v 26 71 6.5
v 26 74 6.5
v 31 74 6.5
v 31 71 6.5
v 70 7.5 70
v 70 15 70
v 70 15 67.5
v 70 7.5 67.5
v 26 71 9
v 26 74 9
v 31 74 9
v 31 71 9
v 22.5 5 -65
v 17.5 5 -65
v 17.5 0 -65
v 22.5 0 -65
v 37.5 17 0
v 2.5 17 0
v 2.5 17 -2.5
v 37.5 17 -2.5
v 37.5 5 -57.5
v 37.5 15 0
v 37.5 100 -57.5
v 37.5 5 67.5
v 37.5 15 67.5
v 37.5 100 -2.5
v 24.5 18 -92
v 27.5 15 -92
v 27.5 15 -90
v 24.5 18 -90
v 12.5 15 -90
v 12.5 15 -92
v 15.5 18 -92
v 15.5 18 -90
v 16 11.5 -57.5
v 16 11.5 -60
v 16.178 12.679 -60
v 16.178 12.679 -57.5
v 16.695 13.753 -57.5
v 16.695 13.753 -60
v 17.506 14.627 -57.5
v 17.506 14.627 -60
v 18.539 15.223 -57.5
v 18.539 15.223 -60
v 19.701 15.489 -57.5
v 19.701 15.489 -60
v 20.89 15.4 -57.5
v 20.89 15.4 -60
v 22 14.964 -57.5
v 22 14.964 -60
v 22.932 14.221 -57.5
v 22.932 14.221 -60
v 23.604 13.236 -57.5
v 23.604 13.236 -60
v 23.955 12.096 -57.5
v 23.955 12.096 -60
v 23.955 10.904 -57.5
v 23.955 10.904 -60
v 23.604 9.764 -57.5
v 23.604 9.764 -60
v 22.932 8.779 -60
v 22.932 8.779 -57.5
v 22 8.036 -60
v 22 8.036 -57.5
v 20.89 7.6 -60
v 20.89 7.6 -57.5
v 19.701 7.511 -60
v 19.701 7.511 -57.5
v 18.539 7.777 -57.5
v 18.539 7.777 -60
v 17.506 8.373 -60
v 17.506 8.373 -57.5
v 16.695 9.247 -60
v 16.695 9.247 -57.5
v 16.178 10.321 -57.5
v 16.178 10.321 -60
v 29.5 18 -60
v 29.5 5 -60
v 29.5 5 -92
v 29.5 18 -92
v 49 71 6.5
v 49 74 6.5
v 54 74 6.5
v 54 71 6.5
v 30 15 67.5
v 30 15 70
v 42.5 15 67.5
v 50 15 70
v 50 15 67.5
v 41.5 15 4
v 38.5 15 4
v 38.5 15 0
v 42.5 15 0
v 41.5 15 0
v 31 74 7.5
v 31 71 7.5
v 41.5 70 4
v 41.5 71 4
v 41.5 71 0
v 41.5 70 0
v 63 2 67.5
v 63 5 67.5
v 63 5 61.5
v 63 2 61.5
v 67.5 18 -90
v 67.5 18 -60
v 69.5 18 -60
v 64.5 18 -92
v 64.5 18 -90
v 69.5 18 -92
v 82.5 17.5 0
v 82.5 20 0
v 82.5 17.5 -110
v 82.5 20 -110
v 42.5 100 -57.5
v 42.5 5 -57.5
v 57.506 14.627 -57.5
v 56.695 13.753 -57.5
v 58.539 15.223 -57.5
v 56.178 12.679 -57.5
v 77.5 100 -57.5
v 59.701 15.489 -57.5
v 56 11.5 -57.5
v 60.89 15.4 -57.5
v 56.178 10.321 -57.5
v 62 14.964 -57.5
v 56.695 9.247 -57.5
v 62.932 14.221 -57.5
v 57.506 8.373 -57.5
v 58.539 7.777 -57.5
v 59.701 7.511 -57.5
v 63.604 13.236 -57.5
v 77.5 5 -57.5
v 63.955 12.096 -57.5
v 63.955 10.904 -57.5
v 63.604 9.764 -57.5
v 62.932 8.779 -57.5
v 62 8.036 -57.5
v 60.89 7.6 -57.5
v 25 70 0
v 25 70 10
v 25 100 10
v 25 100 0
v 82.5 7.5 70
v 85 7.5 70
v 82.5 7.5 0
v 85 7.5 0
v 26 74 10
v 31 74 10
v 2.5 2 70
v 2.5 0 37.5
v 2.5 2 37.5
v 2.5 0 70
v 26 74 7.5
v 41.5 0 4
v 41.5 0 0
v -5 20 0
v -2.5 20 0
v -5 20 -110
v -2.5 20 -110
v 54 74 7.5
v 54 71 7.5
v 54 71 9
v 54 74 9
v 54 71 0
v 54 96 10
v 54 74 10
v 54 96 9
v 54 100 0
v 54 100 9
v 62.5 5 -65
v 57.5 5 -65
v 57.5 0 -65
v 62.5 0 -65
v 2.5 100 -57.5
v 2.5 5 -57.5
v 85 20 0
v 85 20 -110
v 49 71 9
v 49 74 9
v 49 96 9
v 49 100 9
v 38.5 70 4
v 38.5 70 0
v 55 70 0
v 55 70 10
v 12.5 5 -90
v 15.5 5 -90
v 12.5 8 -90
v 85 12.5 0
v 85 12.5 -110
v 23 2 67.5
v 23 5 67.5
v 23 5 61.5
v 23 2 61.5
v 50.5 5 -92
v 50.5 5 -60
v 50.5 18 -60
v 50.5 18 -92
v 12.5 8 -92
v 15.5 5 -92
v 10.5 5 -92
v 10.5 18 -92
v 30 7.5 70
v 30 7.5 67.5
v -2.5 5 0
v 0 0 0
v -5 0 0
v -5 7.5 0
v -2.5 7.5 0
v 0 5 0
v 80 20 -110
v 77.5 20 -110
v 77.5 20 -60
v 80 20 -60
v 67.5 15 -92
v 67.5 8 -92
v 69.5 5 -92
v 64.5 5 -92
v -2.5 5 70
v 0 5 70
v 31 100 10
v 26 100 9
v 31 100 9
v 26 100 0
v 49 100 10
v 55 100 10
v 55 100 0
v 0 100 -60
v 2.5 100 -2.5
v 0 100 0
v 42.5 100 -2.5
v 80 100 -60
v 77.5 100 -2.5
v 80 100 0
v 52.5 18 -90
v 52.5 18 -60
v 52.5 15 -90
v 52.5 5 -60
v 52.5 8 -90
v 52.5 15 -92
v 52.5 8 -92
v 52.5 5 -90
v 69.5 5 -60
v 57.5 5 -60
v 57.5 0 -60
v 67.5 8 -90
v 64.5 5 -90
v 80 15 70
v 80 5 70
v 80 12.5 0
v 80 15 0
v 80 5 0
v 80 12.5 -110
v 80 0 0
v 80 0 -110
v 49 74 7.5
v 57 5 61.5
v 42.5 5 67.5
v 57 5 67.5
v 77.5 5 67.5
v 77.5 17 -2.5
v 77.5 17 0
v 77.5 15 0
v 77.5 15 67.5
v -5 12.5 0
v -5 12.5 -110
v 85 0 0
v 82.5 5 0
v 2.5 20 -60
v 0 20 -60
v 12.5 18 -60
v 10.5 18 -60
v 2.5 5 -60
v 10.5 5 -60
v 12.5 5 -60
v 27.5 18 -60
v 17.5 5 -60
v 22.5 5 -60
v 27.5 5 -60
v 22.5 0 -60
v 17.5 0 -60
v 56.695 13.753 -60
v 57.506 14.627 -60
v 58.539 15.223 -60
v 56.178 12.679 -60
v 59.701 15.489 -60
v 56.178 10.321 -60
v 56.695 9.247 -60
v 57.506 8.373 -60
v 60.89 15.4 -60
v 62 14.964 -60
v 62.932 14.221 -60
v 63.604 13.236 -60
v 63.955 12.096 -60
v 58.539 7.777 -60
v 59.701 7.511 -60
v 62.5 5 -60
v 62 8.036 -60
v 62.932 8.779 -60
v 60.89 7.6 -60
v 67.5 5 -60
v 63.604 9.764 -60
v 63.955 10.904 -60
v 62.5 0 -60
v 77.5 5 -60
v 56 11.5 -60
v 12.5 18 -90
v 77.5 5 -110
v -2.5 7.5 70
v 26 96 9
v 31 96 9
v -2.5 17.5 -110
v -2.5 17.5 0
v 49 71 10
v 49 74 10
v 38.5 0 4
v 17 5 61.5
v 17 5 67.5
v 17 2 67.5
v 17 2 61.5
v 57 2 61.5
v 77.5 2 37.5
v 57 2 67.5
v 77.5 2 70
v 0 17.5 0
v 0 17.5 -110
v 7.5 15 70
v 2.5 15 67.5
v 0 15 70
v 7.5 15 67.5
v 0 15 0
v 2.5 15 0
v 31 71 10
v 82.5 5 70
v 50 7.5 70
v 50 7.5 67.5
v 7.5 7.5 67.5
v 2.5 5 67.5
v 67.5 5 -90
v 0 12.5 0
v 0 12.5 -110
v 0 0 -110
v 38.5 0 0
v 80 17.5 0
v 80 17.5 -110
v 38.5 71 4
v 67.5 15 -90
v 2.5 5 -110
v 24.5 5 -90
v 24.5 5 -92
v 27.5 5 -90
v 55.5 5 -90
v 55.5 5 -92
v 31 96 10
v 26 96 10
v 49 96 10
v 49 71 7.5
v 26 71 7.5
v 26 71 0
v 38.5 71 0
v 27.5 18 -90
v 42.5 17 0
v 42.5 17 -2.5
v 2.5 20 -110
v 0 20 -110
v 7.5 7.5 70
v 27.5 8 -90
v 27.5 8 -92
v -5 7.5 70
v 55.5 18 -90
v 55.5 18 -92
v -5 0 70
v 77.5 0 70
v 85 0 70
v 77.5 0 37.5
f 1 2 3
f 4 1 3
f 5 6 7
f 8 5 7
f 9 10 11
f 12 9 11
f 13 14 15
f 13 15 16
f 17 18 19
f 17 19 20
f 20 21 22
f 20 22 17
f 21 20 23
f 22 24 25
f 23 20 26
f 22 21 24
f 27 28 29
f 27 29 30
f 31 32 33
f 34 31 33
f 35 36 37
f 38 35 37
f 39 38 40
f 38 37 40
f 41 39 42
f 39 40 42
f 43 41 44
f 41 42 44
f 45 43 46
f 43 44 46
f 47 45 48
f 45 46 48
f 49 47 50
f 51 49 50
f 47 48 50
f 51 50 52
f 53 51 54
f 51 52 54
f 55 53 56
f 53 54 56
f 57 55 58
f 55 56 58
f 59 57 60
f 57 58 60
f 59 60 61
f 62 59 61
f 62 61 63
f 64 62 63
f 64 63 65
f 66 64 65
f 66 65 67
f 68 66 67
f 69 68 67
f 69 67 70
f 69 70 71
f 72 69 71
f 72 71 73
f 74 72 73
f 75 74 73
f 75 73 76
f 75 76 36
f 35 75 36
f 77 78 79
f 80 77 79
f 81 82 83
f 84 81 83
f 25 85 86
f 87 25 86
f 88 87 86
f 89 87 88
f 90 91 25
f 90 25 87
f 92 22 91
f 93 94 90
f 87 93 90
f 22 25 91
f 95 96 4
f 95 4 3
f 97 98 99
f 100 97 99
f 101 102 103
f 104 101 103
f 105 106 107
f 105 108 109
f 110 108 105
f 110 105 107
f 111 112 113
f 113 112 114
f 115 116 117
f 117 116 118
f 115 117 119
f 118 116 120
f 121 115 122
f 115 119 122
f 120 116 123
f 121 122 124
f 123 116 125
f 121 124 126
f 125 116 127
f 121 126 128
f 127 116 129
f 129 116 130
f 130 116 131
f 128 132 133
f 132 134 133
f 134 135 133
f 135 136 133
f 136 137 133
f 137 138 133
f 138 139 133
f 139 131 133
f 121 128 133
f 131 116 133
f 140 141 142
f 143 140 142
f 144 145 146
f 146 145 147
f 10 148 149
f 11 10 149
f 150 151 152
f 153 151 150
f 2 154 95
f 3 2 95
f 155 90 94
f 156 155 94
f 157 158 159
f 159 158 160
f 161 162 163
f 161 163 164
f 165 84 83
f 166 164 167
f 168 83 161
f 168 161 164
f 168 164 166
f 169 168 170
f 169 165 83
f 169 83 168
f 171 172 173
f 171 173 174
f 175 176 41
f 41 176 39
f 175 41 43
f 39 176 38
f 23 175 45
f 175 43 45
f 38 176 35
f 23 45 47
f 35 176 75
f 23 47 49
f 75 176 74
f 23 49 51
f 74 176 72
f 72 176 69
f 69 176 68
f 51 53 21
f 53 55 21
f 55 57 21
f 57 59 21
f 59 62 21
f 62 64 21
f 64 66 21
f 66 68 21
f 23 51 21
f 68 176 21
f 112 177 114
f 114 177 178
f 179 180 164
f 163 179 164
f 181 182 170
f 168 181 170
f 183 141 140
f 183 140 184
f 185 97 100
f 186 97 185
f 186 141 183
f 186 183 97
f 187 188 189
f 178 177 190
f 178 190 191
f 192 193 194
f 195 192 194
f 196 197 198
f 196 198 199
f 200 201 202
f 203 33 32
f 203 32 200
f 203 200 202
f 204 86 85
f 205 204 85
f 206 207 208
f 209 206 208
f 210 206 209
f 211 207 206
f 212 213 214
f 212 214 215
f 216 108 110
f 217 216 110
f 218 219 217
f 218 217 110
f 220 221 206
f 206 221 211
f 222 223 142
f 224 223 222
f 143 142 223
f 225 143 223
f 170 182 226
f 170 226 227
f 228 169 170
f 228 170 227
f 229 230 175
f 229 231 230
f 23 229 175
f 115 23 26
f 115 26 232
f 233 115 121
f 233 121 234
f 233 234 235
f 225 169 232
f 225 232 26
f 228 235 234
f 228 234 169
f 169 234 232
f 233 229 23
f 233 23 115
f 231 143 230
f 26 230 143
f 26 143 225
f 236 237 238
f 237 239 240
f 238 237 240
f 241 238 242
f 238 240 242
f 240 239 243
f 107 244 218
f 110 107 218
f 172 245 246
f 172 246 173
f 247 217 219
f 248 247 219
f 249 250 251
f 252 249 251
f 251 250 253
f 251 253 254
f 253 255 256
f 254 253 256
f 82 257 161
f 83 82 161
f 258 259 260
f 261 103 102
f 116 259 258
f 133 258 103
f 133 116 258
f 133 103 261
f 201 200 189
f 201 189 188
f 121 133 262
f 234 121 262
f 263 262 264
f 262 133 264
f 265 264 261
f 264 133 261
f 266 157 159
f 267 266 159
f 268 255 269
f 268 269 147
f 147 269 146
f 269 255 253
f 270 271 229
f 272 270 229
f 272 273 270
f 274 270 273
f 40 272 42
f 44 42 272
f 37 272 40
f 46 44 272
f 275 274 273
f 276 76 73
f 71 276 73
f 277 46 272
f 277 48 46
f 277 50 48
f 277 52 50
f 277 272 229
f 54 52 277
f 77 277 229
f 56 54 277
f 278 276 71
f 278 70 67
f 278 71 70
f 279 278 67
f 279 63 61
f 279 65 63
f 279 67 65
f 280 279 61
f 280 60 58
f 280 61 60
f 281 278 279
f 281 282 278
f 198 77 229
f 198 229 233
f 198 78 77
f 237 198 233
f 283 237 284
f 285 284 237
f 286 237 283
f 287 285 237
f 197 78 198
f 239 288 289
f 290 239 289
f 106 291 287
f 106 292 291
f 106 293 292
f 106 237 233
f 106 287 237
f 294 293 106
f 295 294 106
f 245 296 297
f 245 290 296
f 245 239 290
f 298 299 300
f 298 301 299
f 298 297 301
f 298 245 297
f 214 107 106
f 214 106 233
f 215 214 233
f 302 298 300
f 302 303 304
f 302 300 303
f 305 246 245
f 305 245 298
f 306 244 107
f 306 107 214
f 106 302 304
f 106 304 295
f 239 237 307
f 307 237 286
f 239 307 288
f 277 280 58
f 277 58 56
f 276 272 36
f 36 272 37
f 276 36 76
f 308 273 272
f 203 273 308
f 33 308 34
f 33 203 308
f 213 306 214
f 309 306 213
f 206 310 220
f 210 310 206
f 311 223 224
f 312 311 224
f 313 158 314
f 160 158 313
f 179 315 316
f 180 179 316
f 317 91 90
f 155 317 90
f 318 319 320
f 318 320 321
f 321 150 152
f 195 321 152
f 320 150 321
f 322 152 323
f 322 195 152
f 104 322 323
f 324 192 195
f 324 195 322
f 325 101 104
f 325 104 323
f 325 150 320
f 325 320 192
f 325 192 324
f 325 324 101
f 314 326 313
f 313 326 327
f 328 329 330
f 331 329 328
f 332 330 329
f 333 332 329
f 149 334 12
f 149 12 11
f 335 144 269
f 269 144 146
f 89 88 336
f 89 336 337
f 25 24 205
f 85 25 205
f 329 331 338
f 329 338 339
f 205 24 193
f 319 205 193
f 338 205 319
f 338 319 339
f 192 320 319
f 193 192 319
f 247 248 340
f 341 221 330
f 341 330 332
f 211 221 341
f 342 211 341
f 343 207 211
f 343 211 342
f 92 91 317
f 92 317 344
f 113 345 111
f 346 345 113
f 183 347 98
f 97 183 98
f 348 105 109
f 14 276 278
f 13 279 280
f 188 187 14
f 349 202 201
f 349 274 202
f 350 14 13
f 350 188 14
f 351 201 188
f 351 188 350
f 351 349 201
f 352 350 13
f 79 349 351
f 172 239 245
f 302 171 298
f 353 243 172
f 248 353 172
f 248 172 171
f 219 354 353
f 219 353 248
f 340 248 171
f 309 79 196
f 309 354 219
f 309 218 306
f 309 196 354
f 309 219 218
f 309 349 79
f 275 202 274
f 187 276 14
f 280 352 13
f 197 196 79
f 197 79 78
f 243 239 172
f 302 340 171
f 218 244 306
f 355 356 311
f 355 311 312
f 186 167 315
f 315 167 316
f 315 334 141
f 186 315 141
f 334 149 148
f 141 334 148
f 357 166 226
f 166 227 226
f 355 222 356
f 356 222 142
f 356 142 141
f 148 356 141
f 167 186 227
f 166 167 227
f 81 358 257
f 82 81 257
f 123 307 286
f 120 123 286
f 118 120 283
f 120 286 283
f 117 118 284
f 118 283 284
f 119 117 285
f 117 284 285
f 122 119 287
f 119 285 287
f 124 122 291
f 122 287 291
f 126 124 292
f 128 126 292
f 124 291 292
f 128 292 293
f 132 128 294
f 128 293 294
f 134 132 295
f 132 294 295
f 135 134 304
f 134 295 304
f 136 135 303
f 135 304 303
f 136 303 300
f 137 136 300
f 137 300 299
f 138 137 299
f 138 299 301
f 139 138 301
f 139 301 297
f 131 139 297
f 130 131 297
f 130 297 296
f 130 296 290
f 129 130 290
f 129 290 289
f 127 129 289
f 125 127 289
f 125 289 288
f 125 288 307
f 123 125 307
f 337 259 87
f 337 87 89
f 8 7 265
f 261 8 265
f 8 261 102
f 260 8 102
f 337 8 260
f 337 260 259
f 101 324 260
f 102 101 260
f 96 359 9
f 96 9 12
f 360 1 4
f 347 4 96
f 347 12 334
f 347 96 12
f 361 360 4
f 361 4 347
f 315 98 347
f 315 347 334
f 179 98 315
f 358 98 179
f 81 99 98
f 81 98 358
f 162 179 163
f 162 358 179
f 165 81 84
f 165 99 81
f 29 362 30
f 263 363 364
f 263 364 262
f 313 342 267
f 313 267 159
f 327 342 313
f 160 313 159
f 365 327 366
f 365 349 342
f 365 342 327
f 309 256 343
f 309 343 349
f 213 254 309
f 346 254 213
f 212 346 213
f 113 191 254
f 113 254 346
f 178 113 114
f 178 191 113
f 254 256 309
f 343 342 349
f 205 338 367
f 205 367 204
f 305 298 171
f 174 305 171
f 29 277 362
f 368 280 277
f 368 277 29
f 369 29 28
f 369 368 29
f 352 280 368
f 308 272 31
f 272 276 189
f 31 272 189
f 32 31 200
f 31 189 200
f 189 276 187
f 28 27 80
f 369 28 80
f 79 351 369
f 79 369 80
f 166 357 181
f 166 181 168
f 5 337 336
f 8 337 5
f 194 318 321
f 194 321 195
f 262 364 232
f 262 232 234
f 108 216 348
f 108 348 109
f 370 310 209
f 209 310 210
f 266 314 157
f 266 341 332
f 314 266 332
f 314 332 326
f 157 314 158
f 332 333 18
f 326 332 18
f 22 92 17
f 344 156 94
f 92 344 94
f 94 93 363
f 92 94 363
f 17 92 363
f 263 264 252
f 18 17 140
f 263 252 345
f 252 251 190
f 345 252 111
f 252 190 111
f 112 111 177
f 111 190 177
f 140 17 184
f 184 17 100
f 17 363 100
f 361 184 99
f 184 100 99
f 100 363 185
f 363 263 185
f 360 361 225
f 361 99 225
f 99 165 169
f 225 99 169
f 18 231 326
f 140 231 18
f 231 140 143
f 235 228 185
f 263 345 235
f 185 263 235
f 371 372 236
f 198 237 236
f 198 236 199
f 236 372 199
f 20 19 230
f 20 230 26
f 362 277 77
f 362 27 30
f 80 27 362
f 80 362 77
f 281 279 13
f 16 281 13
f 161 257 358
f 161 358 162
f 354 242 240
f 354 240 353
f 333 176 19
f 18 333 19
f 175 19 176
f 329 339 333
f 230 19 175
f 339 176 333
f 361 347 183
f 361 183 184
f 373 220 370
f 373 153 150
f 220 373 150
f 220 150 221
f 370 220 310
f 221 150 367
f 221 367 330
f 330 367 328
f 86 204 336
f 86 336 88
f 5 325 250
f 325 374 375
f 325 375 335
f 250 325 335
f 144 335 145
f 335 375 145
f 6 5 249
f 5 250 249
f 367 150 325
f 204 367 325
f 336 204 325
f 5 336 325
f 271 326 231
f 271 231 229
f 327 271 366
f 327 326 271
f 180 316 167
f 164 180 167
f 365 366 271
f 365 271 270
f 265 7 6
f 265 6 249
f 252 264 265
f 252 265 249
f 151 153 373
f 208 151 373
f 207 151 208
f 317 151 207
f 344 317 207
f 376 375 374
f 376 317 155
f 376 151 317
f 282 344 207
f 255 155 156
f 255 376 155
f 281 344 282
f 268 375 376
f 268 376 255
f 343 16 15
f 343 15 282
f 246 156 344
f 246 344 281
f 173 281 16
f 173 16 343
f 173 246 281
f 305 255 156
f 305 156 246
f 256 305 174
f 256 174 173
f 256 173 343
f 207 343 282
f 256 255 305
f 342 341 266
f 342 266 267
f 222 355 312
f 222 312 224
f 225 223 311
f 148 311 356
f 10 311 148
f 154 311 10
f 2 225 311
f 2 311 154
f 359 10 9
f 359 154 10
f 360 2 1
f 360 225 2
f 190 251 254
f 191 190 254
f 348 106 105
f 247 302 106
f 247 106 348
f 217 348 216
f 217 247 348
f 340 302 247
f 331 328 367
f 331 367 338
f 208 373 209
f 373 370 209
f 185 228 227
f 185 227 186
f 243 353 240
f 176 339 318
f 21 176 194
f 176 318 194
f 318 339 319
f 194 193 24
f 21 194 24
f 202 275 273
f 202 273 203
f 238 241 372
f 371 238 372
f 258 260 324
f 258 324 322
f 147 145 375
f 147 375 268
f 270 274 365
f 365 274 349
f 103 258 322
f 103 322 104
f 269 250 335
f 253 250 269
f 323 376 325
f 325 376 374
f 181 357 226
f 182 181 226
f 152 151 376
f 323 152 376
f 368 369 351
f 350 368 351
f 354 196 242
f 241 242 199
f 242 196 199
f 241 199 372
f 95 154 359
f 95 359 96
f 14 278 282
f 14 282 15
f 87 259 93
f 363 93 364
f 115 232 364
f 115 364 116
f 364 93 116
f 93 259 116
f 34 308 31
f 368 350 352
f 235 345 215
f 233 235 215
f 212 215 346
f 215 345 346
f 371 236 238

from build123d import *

# Parameters (mm, degrees)
SKETCH1_W                                   = 80
SKETCH1_H                                   = 60
BOSS_EXTRUDE1_DEPTH                         = 100
CUT_EXTRUDE1_START                          = 5
SKETCH2_W                                   = 35
SKETCH2_H                                   = 55
CUT_EXTRUDE1_DEPTH                          = 95
SKETCH3_W                                   = 80
SKETCH3_H                                   = 5
BOSS_EXTRUDE2_DEPTH                         = 70
BOSS_EXTRUDE3_DEPTH                         = 10
SKETCH5_W                                   = 22.5
SKETCH5_H                                   = 2.5
SKETCH5_W_2                                 = 20
CUT_EXTRUDE2_DEPTH                          = 7.5
SKETCH6_W                                   = 35
SKETCH6_H                                   = 12
CUT_EXTRUDE4_DEPTH                          = 57.5
CUT_EXTRUDE6_REACH                          = 184.483
SKETCH7_R                                   = 4
SKETCH9_W                                   = 80
SKETCH9_H                                   = 50
BOSS_EXTRUDE4_DEPTH                         = 5
SKETCH11_W                                  = 75
SKETCH11_H                                  = 32.5
CUT_EXTRUDE7_DEPTH                          = 2
SKETCH13_W                                  = 6
SKETCH13_H                                  = 6
CUT_EXTRUDE8_DEPTH                          = 166.90660023
BOSS_EXTRUDE5_DEPTH                         = 10
SKETCH15_W                                  = 6
SKETCH15_H                                  = 4
BOSS_EXTRUDE6_DEPTH                         = 1
BOSS_EXTRUDE7_START                         = -2.5
SKETCH15_2_W                                = 6
SKETCH15_2_H                                = 4
BOSS_EXTRUDE7_DEPTH                         = 1
SKETCH17_W                                  = 6
SKETCH17_H                                  = 4
BOSS_EXTRUDE8_DEPTH                         = 1
SKETCH18_W                                  = 3
SKETCH18_H                                  = 4
CUT_EXTRUDE9_OLED_CABLE_DEPTH               = 154.430766146
SKETCH20_W                                  = 5
SKETCH20_H                                  = 5
CUT_EXTRUDE10_SOLENOID_WIRE_DEPTH           = 166.90660023
SKETCH21_W                                  = 2
SKETCH21_H                                  = 32
BOSS_EXTRUDE9_SOLENOID_SIDE_SUPPORT_DEPTH   = 13
BOSS_EXTRUDE12_SOLENOID_REAR_SUPPORT_DEPTH  = 2
SKETCH27_W                                  = 2.5
SKETCH27_H                                  = 50
BOSS_EXTRUDE13_SOLENOID_SECTION_WALLS_DEPTH = 15
SKETCH29_W                                  = 70
SKETCH29_H                                  = 5
SKETCH29_W_2                                = 110
BOSS_EXTRUDE14_GUIDE_DEPTH                  = 5
BOSS_EXTRUDE15_START                        = -80
SKETCH29_2_W                                = 70
SKETCH29_2_H                                = 5
SKETCH29_2_W_2                              = 110
BOSS_EXTRUDE15_DEPTH                        = 5
SKETCH30_W                                  = 110
SKETCH30_H                                  = 2.5
SKETCH30_W_2                                = 70
BOSS_EXTRUDE16_DEPTH                        = 2.5
BOSS_EXTRUDE17_START                        = -87.5
SKETCH30_2_W                                = 110
SKETCH30_2_H                                = 2.5
SKETCH30_2_W_2                              = 70
BOSS_EXTRUDE17_DEPTH                        = 2.5


with BuildPart() as part:
    # Sketch1 → Boss-Extrude1 (new body)
    with BuildSketch(Plane(origin=(0, 0, 0), x_dir=(1, 0, 0), z_dir=(0, 1, 0))):
        with Locations((40, 30)):
            Rectangle(SKETCH1_W, SKETCH1_H)
    extrude(amount=BOSS_EXTRUDE1_DEPTH)

    # Sketch2 → Cut-Extrude1 (cut)
    with BuildSketch(Plane(origin=(0, 0, 0), x_dir=(1, 0, 0), z_dir=(0, 1, 0)).offset(CUT_EXTRUDE1_START)):
        with Locations((20, 30)):
            Rectangle(SKETCH2_W, SKETCH2_H)
        with Locations((60, 30)):
            Rectangle(SKETCH2_W, SKETCH2_H)
    extrude(amount=CUT_EXTRUDE1_DEPTH, mode=Mode.SUBTRACT)

    # Sketch3 → Boss-Extrude2 (add)
    with BuildSketch(Plane.XY):
        with Locations((40, 2.5)):
            Rectangle(SKETCH3_W, SKETCH3_H)
    extrude(amount=BOSS_EXTRUDE2_DEPTH)

    # Sketch4 → Boss-Extrude3 (add)
    with BuildSketch(Plane(origin=(0, 5, 0), x_dir=(1, 0, 0), z_dir=(0, 1, 0))):
        Polygon((80, 0), (77.5, 0), (77.5, -67.5), (42.5, -67.5), (42.5, 0), (37.5, 0), (37.5, -67.5), (2.5, -67.5), (2.5, 0), (0, 0), (0, -70), (80, -70), align=None)
    extrude(amount=BOSS_EXTRUDE3_DEPTH)

    # Sketch5 → Cut-Extrude2 (cut)
    with BuildSketch(Plane(origin=(0, 15, 0), x_dir=(1, 0, 0), z_dir=(0, 1, 0))):
        with Locations((18.75, -68.75)):
            Rectangle(SKETCH5_W, SKETCH5_H)
        with Locations((60, -68.75)):
            Rectangle(SKETCH5_W_2, SKETCH5_H)
    extrude(amount=-CUT_EXTRUDE2_DEPTH, mode=Mode.SUBTRACT)

    # Sketch6 → Cut-Extrude4 (cut)
    with BuildSketch(Plane.XY):
        with Locations((20, 11)):
            Rectangle(SKETCH6_W, SKETCH6_H)
        with Locations((60, 11)):
            Rectangle(SKETCH6_W, SKETCH6_H)
    extrude(amount=-CUT_EXTRUDE4_DEPTH, mode=Mode.SUBTRACT)

    # Sketch7 → Cut-Extrude6 (cut, up to next)
    with BuildSketch(Plane(origin=(0, 0, -60), x_dir=(-1, 0, 0), z_dir=(0, 0, -1)), mode=Mode.PRIVATE) as cut_extrude6_sk1:
        with Locations((-20, 11.5)):
            Circle(SKETCH7_R)
    cut_extrude6_tool1 = extrude(cut_extrude6_sk1.sketch, amount=-CUT_EXTRUDE6_REACH, mode=Mode.PRIVATE) & part.part
    # Sketch7 → Cut-Extrude6 (cut, up to next)
    with BuildSketch(Plane(origin=(0, 0, -60), x_dir=(-1, 0, 0), z_dir=(0, 0, -1)), mode=Mode.PRIVATE) as cut_extrude6_sk2:
        with Locations((-60, 11.5)):
            Circle(SKETCH7_R)
    cut_extrude6_tool2 = extrude(cut_extrude6_sk2.sketch, amount=-CUT_EXTRUDE6_REACH, mode=Mode.PRIVATE) & part.part
    add(cut_extrude6_tool1.solids().sort_by_distance((20, 11.5, -60))[0], mode=Mode.SUBTRACT)
    add(cut_extrude6_tool2.solids().sort_by_distance((60, 11.5, -60))[0], mode=Mode.SUBTRACT)

    # Sketch9 → Boss-Extrude4 (add)
    with BuildSketch(Plane(origin=(0, 0, 0), x_dir=(1, 0, 0), z_dir=(0, 1, 0))):
        with Locations((40, 85)):
            Rectangle(SKETCH9_W, SKETCH9_H)
    extrude(amount=BOSS_EXTRUDE4_DEPTH)

    # Sketch11 → Cut-Extrude7 (cut)
    with BuildSketch(Plane.XZ):
        with Locations((40, 53.75)):
            Rectangle(SKETCH11_W, SKETCH11_H)
    extrude(amount=-CUT_EXTRUDE7_DEPTH, mode=Mode.SUBTRACT)

    # Sketch13 → Cut-Extrude8 (cut, through all)
    with BuildSketch(Plane(origin=(0, 5, 0), x_dir=(1, 0, 0), z_dir=(0, 1, 0))):
        with Locations((20, -64.5)):
            Rectangle(SKETCH13_W, SKETCH13_H)
        with Locations((60, -64.5)):
            Rectangle(SKETCH13_W, SKETCH13_H)
    extrude(amount=-CUT_EXTRUDE8_DEPTH, mode=Mode.SUBTRACT)

    # Sketch14 → Boss-Extrude5 (add)
    with BuildSketch(Plane.XY):
        Polygon((25, 100), (26, 100), (26, 71), (54, 71), (54, 100), (55, 100), (55, 70), (54, 70), (26, 70), (25, 70), align=None)
    extrude(amount=BOSS_EXTRUDE5_DEPTH)

    # Sketch15 → Boss-Extrude6 (add)
    with BuildSketch(Plane.XY.offset(10)):
        with Locations((28, 72)):
            Rectangle(SKETCH15_W, SKETCH15_H)
        with Locations((52, 72)):
            Rectangle(SKETCH15_W, SKETCH15_H)
    extrude(amount=-BOSS_EXTRUDE6_DEPTH)

    # Sketch15<2> → Boss-Extrude7 (add)
    with BuildSketch(Plane.XY.offset(10).offset(BOSS_EXTRUDE7_START)):
        with Locations((28, 72)):
            Rectangle(SKETCH15_2_W, SKETCH15_2_H)
        with Locations((52, 72)):
            Rectangle(SKETCH15_2_W, SKETCH15_2_H)
    extrude(amount=-BOSS_EXTRUDE7_DEPTH)

    # Sketch17 → Boss-Extrude8 (add)
    with BuildSketch(Plane.XY.offset(10)):
        with Locations((28, 98)):
            Rectangle(SKETCH17_W, SKETCH17_H)
        with Locations((52, 98)):
            Rectangle(SKETCH17_W, SKETCH17_H)
    extrude(amount=-BOSS_EXTRUDE8_DEPTH)

    # Sketch18 → Cut-Extrude9 (OLED Cable) (cut, through all)
    with BuildSketch(Plane(origin=(0, 71, 0), x_dir=(1, 0, 0), z_dir=(0, 1, 0))):
        with Locations((40, -2)):
            Rectangle(SKETCH18_W, SKETCH18_H)
    extrude(amount=-CUT_EXTRUDE9_OLED_CABLE_DEPTH, mode=Mode.SUBTRACT)

    # Sketch20 → Cut-Extrude10 (Solenoid Wire) (cut, through all)
    with BuildSketch(Plane(origin=(0, 5, 0), x_dir=(1, 0, 0), z_dir=(0, 1, 0))):
        with Locations((60, 62.5)):
            Rectangle(SKETCH20_W, SKETCH20_H)
        with Locations((20, 62.5)):
            Rectangle(SKETCH20_W, SKETCH20_H)
    extrude(amount=-CUT_EXTRUDE10_SOLENOID_WIRE_DEPTH, mode=Mode.SUBTRACT)

    # Sketch21 → Boss-Extrude9 (Solenoid Side Support) (add)
    with BuildSketch(Plane(origin=(0, 5, 0), x_dir=(1, 0, 0), z_dir=(0, 1, 0))):
        with Locations((68.5, 76)):
            Rectangle(SKETCH21_W, SKETCH21_H)
        with Locations((51.5, 76)):
            Rectangle(SKETCH21_W, SKETCH21_H)
        with Locations((28.5, 76)):
            Rectangle(SKETCH21_W, SKETCH21_H)
        with Locations((11.5, 76)):
            Rectangle(SKETCH21_W, SKETCH21_H)
    extrude(amount=BOSS_EXTRUDE9_SOLENOID_SIDE_SUPPORT_DEPTH)

    # Sketch25 → Boss-Extrude12 (Solenoid Rear Support) (add)
    with BuildSketch(Plane(origin=(0, 0, -92), x_dir=(-1, 0, 0), z_dir=(0, 0, -1))):
        Polygon((-55.5, 18), (-52.5, 18), (-52.5, 15), align=None)
        Polygon((-52.5, 5), (-52.5, 8), (-55.5, 5), align=None)
        Polygon((-67.5, 18), (-67.5, 15), (-64.5, 18), align=None)
        Polygon((-64.5, 5), (-67.5, 5), (-67.5, 8), align=None)
        Polygon((-15.5, 18), (-12.5, 18), (-12.5, 15), align=None)
        Polygon((-12.5, 5), (-12.5, 8), (-15.5, 5), align=None)
        Polygon((-27.5, 18), (-27.5, 15), (-24.5, 18), align=None)
        Polygon((-24.5, 5), (-27.5, 5), (-27.5, 8), align=None)
    extrude(amount=-BOSS_EXTRUDE12_SOLENOID_REAR_SUPPORT_DEPTH)

    # Sketch27 → Boss-Extrude13 (Solenoid Section Walls) (add)
    with BuildSketch(Plane(origin=(0, 5, 0), x_dir=(1, 0, 0), z_dir=(0, 1, 0))):
        with Locations((78.75, 85)):
            Rectangle(SKETCH27_W, SKETCH27_H)
        with Locations((1.25, 85)):
            Rectangle(SKETCH27_W, SKETCH27_H)
    extrude(amount=BOSS_EXTRUDE13_SOLENOID_SECTION_WALLS_DEPTH)

    # Sketch29 → Boss-Extrude14 (Guide) (add)
    with BuildSketch(Plane(origin=(80, 0, 0), x_dir=(0, 0, -1), z_dir=(1, 0, 0))):
        with Locations((-35, 2.5)):
            Rectangle(SKETCH29_W, SKETCH29_H)
        with Locations((55, 15)):
            Rectangle(SKETCH29_W_2, SKETCH29_H)
    extrude(amount=BOSS_EXTRUDE14_GUIDE_DEPTH)

    # Sketch29<2> → Boss-Extrude15 (add)
    with BuildSketch(Plane(origin=(80, 0, 0), x_dir=(0, 0, -1), z_dir=(1, 0, 0)).offset(BOSS_EXTRUDE15_START)):
        with Locations((-35, 2.5)):
            Rectangle(SKETCH29_2_W, SKETCH29_2_H)
        with Locations((55, 15)):
            Rectangle(SKETCH29_2_W_2, SKETCH29_2_H)
    extrude(amount=-BOSS_EXTRUDE15_DEPTH)

    # Sketch30 → Boss-Extrude16 (add)
    with BuildSketch(Plane(origin=(85, 0, 0), x_dir=(0, 0, -1), z_dir=(1, 0, 0))):
        with Locations((55, 18.75)):
            Rectangle(SKETCH30_W, SKETCH30_H)
        with Locations((-35, 6.25)):
            Rectangle(SKETCH30_W_2, SKETCH30_H)
    extrude(amount=-BOSS_EXTRUDE16_DEPTH)

    # Sketch30<2> → Boss-Extrude17 (add)
    with BuildSketch(Plane(origin=(85, 0, 0), x_dir=(0, 0, -1), z_dir=(1, 0, 0)).offset(BOSS_EXTRUDE17_START)):
        with Locations((55, 18.75)):
            Rectangle(SKETCH30_2_W, SKETCH30_2_H)
        with Locations((-35, 6.25)):
            Rectangle(SKETCH30_2_W_2, SKETCH30_2_H)
    extrude(amount=-BOSS_EXTRUDE17_DEPTH)


solid = part.part
